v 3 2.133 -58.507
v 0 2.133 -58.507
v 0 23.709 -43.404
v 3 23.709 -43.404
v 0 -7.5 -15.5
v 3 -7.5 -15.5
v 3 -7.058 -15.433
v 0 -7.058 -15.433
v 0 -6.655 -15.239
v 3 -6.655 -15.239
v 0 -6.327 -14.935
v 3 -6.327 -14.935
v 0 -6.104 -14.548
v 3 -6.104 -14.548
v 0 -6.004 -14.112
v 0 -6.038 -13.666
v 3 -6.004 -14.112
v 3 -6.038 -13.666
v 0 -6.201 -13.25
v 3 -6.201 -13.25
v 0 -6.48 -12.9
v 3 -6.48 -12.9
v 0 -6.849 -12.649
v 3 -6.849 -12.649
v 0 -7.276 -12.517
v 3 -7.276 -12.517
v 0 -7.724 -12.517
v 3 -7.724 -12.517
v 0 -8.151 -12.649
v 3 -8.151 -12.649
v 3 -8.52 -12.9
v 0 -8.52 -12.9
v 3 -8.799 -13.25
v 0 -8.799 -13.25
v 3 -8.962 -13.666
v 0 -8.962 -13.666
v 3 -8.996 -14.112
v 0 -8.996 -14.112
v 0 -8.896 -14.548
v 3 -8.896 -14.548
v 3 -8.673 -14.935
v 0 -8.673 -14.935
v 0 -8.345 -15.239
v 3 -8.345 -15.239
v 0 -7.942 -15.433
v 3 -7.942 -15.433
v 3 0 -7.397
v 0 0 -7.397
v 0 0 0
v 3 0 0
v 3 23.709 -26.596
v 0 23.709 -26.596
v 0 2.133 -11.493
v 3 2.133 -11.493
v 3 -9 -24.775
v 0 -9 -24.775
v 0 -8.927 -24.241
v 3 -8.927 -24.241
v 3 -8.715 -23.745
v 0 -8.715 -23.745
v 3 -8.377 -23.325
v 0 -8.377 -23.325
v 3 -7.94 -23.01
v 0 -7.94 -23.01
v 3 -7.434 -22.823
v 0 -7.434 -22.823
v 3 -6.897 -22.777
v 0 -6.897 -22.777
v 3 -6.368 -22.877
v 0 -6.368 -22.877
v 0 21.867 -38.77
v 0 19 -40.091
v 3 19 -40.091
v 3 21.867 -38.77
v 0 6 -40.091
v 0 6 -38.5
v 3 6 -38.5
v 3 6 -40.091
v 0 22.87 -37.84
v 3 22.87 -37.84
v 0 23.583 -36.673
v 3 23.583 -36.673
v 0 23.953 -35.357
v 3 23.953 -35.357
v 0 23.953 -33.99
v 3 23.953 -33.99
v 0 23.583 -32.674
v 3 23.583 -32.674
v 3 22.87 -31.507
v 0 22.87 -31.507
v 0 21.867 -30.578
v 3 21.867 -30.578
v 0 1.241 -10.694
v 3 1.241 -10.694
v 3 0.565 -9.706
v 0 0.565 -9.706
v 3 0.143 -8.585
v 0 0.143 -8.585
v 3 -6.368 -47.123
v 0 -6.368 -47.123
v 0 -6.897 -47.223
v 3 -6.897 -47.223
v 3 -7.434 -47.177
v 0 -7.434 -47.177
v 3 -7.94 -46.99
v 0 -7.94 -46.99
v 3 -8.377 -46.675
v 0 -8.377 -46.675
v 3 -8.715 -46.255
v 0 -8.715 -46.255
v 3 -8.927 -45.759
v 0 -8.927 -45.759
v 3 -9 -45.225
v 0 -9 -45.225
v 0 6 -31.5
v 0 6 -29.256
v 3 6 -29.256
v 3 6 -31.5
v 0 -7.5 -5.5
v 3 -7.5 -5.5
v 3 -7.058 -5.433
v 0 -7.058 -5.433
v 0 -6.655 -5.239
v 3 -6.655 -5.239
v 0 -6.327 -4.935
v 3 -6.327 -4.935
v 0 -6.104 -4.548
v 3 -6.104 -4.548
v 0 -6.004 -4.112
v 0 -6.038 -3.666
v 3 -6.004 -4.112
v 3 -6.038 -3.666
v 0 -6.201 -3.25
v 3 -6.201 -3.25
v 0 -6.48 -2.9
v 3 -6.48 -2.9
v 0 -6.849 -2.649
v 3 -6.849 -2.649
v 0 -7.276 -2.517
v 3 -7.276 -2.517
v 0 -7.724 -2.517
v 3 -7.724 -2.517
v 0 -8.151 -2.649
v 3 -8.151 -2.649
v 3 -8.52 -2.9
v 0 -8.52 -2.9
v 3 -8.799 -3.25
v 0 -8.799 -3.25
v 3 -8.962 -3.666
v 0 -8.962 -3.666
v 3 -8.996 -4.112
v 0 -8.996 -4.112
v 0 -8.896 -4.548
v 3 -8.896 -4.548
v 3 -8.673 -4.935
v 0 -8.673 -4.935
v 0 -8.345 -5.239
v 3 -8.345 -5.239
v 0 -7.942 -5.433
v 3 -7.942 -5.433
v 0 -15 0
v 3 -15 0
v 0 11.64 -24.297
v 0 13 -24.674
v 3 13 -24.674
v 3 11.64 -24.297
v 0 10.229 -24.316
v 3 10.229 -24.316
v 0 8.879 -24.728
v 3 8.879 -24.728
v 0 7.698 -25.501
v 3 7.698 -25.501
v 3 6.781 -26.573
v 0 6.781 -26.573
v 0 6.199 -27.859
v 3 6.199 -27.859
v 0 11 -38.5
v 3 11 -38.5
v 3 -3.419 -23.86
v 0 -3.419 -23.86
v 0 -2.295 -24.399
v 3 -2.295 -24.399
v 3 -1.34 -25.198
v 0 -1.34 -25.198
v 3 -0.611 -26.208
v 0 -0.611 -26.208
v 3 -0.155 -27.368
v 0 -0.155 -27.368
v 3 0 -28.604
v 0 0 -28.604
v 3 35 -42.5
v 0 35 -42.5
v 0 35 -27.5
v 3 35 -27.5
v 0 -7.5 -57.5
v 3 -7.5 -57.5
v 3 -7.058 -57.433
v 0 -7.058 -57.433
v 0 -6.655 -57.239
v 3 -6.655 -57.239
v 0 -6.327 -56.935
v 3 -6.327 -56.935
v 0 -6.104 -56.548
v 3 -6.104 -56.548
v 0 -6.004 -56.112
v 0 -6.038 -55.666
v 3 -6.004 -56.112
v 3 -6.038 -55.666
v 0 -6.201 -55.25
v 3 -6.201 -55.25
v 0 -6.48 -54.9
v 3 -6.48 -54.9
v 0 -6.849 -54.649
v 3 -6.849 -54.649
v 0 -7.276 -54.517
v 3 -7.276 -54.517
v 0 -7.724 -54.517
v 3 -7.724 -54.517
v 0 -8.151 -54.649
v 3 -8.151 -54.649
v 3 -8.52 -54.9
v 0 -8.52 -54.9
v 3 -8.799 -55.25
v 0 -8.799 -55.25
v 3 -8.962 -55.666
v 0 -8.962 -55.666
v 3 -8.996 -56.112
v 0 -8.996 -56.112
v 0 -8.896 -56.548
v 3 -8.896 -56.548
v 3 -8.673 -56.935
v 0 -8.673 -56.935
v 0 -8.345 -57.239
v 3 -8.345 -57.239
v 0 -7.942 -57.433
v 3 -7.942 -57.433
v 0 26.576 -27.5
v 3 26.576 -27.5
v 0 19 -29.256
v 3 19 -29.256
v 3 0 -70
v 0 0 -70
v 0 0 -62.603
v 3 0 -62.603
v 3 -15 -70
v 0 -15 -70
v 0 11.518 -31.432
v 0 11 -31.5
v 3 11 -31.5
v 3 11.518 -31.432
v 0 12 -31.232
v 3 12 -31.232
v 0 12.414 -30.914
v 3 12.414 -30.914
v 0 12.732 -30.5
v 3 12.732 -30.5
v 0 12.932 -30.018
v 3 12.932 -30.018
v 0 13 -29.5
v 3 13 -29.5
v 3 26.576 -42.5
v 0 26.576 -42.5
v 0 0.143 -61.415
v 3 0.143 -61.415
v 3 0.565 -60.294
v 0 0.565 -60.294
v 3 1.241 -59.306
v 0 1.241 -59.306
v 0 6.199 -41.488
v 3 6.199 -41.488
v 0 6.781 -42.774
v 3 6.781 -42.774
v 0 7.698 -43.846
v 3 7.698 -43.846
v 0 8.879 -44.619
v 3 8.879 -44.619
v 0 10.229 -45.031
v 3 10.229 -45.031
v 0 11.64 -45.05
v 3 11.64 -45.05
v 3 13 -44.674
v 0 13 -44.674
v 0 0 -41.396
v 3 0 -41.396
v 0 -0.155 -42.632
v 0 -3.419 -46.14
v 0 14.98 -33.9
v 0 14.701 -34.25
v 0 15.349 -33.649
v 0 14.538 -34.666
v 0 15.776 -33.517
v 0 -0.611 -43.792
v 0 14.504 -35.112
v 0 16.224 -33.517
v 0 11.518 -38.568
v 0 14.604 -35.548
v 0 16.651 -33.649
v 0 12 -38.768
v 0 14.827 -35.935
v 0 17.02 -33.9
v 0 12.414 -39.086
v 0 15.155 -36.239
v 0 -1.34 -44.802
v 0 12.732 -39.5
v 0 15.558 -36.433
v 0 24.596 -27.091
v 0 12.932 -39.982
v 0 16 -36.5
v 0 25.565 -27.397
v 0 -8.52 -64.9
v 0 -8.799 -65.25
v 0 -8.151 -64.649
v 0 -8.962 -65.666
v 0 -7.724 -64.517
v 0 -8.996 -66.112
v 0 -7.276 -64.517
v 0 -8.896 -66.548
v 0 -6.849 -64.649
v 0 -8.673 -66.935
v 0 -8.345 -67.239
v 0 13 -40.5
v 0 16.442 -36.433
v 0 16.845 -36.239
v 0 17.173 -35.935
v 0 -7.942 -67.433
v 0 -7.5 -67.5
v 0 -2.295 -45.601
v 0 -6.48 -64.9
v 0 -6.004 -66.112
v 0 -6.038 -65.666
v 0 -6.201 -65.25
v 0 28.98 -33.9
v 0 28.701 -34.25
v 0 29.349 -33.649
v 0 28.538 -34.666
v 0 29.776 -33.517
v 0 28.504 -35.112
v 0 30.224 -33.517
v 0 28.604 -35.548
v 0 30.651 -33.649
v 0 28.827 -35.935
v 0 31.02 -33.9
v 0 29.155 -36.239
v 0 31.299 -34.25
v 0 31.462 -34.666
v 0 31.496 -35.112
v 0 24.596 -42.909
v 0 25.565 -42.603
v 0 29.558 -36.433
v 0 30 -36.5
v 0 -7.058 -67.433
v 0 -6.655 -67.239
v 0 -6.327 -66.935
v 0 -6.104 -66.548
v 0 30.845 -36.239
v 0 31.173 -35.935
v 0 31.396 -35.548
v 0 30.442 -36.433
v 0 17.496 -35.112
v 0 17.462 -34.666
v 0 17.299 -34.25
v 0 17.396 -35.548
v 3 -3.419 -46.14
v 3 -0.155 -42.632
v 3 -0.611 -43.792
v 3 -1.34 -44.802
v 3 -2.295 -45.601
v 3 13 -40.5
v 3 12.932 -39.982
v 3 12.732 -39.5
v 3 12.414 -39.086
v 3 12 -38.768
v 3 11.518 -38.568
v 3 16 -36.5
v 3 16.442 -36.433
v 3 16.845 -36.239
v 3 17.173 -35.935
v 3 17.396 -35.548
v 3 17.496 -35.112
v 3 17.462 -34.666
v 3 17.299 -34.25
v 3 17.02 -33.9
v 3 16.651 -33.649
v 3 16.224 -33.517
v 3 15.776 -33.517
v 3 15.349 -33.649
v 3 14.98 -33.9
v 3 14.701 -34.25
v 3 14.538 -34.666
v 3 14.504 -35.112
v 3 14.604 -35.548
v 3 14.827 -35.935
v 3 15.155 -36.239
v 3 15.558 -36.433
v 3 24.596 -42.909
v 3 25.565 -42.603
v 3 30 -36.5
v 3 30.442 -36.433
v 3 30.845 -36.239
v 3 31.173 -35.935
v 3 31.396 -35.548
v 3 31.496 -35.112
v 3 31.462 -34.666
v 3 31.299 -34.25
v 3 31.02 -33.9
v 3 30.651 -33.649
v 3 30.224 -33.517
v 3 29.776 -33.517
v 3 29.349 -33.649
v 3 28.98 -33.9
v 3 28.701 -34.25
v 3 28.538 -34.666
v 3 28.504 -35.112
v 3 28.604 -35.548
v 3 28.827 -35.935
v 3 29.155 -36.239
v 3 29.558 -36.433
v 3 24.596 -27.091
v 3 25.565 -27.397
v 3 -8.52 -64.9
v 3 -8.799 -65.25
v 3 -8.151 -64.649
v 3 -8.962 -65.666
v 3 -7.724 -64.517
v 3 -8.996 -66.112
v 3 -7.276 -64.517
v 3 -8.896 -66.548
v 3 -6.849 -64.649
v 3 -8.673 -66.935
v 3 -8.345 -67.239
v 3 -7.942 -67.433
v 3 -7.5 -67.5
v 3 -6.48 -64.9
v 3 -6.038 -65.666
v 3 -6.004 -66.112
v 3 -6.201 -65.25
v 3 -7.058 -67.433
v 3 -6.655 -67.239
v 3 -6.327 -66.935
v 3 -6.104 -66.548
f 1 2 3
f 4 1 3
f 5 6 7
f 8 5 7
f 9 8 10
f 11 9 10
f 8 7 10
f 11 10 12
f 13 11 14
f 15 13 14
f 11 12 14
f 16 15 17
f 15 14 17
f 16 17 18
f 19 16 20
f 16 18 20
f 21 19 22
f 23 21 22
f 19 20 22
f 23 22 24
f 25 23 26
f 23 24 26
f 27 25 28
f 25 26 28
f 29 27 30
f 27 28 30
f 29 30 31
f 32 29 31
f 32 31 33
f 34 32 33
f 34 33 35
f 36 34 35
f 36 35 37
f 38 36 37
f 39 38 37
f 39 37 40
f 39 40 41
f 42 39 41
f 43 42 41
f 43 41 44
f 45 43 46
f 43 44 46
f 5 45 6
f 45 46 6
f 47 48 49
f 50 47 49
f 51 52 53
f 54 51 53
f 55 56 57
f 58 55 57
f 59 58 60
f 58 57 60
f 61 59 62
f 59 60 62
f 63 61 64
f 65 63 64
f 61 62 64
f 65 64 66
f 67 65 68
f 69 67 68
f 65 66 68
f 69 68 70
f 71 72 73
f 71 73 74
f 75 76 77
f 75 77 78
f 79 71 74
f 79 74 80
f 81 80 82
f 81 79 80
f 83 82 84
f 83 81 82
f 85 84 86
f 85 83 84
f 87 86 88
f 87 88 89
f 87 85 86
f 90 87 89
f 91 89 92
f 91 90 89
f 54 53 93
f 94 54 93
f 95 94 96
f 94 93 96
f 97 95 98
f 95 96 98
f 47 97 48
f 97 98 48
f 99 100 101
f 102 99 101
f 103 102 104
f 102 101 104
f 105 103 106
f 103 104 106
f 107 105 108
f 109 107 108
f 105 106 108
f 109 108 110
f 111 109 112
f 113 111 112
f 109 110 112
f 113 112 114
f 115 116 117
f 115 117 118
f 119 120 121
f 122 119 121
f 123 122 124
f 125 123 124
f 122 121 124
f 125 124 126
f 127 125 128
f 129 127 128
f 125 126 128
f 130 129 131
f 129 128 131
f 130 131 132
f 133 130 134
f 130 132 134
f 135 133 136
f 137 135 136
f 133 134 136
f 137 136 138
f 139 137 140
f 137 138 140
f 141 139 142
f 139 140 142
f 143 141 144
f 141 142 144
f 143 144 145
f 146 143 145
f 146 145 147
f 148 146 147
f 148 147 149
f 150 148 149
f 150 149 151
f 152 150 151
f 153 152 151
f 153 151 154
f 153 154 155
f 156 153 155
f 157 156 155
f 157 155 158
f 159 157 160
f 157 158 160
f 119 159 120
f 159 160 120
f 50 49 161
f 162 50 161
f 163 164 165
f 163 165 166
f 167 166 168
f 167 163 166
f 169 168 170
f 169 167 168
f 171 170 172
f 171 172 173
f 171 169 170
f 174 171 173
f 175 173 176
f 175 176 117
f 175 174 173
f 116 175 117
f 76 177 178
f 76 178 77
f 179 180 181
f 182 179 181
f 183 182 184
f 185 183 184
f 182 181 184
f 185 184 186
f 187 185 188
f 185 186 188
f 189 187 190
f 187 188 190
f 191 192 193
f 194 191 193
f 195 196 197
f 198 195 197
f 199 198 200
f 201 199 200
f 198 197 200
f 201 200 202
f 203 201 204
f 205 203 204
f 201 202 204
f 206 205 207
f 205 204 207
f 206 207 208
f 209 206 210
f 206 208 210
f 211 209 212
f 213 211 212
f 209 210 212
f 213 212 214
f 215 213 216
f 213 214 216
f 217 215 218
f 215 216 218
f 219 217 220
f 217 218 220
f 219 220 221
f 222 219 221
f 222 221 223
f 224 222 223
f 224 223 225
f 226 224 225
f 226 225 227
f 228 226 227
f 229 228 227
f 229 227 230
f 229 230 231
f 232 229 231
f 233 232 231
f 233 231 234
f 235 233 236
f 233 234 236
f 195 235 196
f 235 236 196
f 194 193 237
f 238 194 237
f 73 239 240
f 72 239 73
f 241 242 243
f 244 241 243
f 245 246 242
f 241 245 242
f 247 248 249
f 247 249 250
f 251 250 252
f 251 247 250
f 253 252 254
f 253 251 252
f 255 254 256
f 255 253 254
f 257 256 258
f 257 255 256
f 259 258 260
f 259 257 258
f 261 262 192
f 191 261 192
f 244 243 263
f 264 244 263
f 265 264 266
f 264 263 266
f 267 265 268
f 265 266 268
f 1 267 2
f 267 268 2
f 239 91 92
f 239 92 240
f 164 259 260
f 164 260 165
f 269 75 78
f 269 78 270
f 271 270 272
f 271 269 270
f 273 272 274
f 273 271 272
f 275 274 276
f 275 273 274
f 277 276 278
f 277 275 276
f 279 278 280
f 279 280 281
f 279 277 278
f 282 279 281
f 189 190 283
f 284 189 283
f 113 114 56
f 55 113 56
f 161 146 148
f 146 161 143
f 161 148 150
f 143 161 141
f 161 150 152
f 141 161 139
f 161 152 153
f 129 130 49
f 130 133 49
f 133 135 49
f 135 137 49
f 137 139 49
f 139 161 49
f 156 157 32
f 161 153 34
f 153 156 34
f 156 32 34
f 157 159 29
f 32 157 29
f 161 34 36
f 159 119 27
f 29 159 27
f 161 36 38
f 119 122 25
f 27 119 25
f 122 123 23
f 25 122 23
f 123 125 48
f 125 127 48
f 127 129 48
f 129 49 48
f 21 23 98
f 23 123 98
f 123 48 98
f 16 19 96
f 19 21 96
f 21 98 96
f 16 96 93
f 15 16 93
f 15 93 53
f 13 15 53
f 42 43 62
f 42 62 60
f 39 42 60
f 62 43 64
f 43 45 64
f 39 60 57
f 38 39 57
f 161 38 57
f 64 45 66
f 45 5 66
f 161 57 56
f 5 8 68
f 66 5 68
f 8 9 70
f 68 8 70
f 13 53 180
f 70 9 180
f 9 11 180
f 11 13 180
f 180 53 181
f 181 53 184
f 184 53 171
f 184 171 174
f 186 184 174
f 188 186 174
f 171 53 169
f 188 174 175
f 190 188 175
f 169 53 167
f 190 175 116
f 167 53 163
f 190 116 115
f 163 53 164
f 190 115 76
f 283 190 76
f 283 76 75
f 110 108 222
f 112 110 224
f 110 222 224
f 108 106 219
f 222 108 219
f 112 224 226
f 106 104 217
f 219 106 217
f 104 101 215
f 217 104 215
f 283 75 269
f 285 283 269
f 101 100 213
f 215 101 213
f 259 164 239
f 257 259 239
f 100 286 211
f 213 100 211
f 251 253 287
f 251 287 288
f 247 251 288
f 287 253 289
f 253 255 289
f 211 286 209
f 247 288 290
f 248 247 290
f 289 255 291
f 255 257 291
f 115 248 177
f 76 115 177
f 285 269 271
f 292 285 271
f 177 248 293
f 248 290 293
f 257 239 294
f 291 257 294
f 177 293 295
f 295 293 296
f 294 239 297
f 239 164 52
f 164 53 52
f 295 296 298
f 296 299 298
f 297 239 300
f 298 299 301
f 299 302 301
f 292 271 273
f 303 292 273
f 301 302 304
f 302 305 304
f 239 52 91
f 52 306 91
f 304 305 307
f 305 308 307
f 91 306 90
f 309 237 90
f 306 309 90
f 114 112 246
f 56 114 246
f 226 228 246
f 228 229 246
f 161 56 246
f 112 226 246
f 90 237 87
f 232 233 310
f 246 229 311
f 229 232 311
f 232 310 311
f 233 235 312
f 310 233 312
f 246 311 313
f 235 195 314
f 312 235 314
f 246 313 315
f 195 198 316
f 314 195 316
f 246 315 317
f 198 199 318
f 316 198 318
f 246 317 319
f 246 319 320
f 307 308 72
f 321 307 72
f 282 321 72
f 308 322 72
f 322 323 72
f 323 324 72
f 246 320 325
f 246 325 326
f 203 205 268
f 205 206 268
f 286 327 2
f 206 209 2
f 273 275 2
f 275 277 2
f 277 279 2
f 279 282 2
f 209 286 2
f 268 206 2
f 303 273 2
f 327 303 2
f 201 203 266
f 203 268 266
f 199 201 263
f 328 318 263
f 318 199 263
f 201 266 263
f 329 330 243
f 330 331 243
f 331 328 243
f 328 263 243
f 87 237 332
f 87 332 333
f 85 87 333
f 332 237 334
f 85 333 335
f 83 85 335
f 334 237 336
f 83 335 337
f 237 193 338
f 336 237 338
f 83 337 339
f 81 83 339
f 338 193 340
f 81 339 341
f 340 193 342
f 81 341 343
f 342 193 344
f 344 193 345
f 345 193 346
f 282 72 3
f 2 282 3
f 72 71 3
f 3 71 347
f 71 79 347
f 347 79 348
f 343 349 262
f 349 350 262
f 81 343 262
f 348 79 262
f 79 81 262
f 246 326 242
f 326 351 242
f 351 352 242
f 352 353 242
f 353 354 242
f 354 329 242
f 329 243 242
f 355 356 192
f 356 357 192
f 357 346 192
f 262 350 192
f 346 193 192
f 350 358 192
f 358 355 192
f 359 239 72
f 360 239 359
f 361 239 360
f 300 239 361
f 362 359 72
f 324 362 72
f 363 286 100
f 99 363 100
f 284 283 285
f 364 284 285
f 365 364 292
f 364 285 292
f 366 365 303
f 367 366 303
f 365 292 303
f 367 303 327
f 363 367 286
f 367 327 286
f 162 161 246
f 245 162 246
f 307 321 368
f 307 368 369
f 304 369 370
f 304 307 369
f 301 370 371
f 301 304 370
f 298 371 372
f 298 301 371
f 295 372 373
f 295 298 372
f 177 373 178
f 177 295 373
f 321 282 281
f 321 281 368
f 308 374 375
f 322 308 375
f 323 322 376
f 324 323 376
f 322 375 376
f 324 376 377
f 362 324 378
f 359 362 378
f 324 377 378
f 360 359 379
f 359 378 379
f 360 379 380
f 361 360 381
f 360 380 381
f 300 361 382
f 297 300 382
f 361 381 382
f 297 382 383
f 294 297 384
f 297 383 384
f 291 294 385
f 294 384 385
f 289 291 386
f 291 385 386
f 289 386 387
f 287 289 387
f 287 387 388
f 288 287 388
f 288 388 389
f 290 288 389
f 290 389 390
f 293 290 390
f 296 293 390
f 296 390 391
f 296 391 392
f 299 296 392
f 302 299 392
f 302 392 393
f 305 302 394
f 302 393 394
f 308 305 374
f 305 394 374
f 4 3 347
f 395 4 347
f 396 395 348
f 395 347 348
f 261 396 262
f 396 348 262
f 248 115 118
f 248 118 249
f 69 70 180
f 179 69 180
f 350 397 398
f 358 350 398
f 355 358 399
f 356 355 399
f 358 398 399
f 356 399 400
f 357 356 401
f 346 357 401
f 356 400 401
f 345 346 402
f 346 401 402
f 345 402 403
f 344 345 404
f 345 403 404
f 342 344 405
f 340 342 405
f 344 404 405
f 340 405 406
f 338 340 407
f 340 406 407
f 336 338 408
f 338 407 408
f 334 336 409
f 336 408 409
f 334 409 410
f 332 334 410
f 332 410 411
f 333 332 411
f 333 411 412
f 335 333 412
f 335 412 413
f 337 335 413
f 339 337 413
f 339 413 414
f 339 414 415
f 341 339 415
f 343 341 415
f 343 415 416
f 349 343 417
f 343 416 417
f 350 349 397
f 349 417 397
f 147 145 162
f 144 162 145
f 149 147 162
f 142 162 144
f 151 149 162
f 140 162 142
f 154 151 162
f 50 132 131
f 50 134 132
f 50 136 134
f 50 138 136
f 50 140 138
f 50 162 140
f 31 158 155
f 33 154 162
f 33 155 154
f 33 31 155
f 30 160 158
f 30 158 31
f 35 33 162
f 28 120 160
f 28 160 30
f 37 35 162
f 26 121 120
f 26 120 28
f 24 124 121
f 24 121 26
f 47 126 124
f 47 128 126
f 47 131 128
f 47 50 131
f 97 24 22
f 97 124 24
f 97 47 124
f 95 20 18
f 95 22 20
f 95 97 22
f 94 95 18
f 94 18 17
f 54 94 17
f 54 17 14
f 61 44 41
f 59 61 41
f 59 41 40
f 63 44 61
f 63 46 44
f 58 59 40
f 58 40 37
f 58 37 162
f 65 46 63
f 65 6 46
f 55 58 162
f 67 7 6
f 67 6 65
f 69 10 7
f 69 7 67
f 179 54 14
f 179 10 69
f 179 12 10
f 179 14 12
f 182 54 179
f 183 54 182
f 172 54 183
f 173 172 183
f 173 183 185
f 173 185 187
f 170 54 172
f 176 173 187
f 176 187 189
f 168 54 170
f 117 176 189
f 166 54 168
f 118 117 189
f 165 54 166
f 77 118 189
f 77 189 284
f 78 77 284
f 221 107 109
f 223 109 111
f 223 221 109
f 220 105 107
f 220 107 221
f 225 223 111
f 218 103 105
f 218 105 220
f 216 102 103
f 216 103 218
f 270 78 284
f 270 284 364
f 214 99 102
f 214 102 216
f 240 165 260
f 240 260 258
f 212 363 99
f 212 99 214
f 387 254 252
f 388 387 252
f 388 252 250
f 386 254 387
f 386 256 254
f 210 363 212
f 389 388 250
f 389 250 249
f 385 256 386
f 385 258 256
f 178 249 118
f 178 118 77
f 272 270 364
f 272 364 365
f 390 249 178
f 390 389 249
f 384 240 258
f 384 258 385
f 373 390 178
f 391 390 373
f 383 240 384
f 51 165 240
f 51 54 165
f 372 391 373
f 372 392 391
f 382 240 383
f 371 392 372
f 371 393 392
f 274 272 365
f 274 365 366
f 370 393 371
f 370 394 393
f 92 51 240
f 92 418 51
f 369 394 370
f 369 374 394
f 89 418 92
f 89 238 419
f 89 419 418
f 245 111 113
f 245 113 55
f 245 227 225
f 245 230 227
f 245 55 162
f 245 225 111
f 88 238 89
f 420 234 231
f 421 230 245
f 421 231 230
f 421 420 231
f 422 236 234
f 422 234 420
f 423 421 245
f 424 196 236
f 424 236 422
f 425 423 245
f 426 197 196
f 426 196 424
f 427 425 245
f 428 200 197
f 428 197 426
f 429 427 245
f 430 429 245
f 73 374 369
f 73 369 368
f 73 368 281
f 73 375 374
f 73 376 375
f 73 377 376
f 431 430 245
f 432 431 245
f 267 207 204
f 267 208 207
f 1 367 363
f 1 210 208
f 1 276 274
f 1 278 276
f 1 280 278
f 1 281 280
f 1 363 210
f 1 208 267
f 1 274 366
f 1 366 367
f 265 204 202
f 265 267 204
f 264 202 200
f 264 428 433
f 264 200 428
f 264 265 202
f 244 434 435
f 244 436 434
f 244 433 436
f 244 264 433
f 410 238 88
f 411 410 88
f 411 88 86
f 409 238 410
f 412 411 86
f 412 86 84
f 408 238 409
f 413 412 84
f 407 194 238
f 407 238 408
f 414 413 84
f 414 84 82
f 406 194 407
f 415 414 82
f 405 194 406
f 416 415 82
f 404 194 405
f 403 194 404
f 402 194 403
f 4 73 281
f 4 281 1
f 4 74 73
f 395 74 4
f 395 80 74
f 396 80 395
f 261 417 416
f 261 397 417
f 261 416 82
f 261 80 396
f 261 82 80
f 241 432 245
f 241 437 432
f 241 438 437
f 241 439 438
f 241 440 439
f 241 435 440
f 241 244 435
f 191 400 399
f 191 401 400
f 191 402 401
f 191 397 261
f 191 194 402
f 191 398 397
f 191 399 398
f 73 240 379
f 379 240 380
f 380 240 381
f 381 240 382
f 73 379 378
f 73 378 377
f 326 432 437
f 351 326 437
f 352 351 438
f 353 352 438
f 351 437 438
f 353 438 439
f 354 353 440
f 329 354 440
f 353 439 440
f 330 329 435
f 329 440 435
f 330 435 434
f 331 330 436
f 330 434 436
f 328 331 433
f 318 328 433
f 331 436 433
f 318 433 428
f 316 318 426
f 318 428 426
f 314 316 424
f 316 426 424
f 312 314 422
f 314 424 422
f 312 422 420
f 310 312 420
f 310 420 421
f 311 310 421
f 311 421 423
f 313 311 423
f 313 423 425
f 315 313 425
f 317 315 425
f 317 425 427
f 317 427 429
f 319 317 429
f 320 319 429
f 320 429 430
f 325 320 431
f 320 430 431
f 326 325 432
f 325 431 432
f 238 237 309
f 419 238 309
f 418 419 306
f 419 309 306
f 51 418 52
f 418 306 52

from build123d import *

# Parameters (mm, degrees)
EXTRUDE_1_DEPTH     = 3
SKETCH_3_R          = 1.5
CUT_EXTRUDE_1_DEPTH = 3


with BuildPart() as part:
    # 草图2 → 凸台-拉伸1 (new body)
    with BuildSketch(Plane(origin=(0, 0, 0), x_dir=(0, 0, -1), z_dir=(1, 0, 0))):
        with BuildLine():
            Line((0, 0), (0, -15))
            Line((0, -15), (20, -15))
            Line((20, -15), (50, -15))
            Line((50, -15), (70, -15))
            Line((70, -15), (70, 0))
            Line((70, 0), (62.603277808, 0))
            ThreePointArc((62.603277808, 0), (60.294225904, 0.565106619), (58.507118205, 2.132688278))
            Line((58.507118205, 2.132688278), (43.403840397, 23.708799432))
            ThreePointArc((43.403840397, 23.708799432), (42.731310557, 25.07291423), (42.5, 26.576111154))
            Line((42.5, 26.576111154), (42.5, 35))
            Line((42.5, 35), (27.5, 35))
            Line((27.5, 35), (27.5, 26.576111154))
            ThreePointArc((27.5, 26.576111154), (27.268689443, 25.07291423), (26.596159603, 23.708799432))
            Line((26.596159603, 23.708799432), (11.492881795, 2.132688278))
            ThreePointArc((11.492881795, 2.132688278), (9.705774096, 0.565106619), (7.396722192, 0))
            Line((7.396722192, 0), (0, 0))
        make_face()
        with BuildLine():
            Line((22.877485177, -6.367544468), (23.86037961, -3.41886117))
            ThreePointArc((23.86037961, -3.41886117), (25.680244677, -0.943789074), (28.6037961, 0))
            Line((28.6037961, 0), (41.3962039, 0))
            ThreePointArc((41.3962039, 0), (44.319755323, -0.943789074), (46.13962039, -3.41886117))
            Line((46.13962039, -3.41886117), (47.122514823, -6.367544468))
            ThreePointArc((47.122514823, -6.367544468), (46.847632597, -8.169420569), (45.225148227, -9))
            Line((45.225148227, -9), (24.774851773, -9))
            ThreePointArc((24.774851773, -9), (23.152367403, -8.169420569), (22.877485177, -6.367544468))
        make_face(mode=Mode.SUBTRACT)
        with BuildLine():
            Line((29.256242147, 6), (31.5, 6))
            Line((31.5, 6), (31.5, 11))
            ThreePointArc((31.5, 11), (30.914213562, 12.414213562), (29.5, 13))
            Line((29.5, 13), (24.673666452, 13))
            ThreePointArc((24.673666452, 13), (25.072942015, 8.261387212), (29.256242147, 6))
        make_face(mode=Mode.SUBTRACT)
        with BuildLine():
            Line((30.57750685, 21.867311722), (29.256242147, 19))
            Line((29.256242147, 19), (40.091090757, 19))
            Line((40.091090757, 19), (38.769826055, 21.867311722))
            ThreePointArc((38.769826055, 21.867311722), (34.673666452, 24), (30.57750685, 21.867311722))
        make_face(mode=Mode.SUBTRACT)
        with BuildLine():
            Line((38.5, 11), (38.5, 6))
            Line((38.5, 6), (40.091090757, 6))
            ThreePointArc((40.091090757, 6), (44.27439089, 8.261387212), (44.673666452, 13))
            Line((44.673666452, 13), (40.5, 13))
            ThreePointArc((40.5, 13), (39.085786438, 12.414213562), (38.5, 11))
        make_face(mode=Mode.SUBTRACT)
    extrude(amount=EXTRUDE_1_DEPTH)

    # 草图3 → 切除-拉伸1 (cut)
    with BuildSketch(Plane(origin=(3, 0, 0), x_dir=(0, 0, -1), z_dir=(1, 0, 0))):
        with Locations((35, 30)):
            Circle(SKETCH_3_R)
        with Locations((66, -7.5)):
            Circle(SKETCH_3_R)
        with Locations((56, -7.5)):
            Circle(SKETCH_3_R)
        with Locations((14, -7.5)):
            Circle(SKETCH_3_R)
        with Locations((4, -7.5)):
            Circle(SKETCH_3_R)
        with Locations((35, 16)):
            Circle(SKETCH_3_R)
    extrude(amount=-CUT_EXTRUDE_1_DEPTH, mode=Mode.SUBTRACT)


solid = part.part
